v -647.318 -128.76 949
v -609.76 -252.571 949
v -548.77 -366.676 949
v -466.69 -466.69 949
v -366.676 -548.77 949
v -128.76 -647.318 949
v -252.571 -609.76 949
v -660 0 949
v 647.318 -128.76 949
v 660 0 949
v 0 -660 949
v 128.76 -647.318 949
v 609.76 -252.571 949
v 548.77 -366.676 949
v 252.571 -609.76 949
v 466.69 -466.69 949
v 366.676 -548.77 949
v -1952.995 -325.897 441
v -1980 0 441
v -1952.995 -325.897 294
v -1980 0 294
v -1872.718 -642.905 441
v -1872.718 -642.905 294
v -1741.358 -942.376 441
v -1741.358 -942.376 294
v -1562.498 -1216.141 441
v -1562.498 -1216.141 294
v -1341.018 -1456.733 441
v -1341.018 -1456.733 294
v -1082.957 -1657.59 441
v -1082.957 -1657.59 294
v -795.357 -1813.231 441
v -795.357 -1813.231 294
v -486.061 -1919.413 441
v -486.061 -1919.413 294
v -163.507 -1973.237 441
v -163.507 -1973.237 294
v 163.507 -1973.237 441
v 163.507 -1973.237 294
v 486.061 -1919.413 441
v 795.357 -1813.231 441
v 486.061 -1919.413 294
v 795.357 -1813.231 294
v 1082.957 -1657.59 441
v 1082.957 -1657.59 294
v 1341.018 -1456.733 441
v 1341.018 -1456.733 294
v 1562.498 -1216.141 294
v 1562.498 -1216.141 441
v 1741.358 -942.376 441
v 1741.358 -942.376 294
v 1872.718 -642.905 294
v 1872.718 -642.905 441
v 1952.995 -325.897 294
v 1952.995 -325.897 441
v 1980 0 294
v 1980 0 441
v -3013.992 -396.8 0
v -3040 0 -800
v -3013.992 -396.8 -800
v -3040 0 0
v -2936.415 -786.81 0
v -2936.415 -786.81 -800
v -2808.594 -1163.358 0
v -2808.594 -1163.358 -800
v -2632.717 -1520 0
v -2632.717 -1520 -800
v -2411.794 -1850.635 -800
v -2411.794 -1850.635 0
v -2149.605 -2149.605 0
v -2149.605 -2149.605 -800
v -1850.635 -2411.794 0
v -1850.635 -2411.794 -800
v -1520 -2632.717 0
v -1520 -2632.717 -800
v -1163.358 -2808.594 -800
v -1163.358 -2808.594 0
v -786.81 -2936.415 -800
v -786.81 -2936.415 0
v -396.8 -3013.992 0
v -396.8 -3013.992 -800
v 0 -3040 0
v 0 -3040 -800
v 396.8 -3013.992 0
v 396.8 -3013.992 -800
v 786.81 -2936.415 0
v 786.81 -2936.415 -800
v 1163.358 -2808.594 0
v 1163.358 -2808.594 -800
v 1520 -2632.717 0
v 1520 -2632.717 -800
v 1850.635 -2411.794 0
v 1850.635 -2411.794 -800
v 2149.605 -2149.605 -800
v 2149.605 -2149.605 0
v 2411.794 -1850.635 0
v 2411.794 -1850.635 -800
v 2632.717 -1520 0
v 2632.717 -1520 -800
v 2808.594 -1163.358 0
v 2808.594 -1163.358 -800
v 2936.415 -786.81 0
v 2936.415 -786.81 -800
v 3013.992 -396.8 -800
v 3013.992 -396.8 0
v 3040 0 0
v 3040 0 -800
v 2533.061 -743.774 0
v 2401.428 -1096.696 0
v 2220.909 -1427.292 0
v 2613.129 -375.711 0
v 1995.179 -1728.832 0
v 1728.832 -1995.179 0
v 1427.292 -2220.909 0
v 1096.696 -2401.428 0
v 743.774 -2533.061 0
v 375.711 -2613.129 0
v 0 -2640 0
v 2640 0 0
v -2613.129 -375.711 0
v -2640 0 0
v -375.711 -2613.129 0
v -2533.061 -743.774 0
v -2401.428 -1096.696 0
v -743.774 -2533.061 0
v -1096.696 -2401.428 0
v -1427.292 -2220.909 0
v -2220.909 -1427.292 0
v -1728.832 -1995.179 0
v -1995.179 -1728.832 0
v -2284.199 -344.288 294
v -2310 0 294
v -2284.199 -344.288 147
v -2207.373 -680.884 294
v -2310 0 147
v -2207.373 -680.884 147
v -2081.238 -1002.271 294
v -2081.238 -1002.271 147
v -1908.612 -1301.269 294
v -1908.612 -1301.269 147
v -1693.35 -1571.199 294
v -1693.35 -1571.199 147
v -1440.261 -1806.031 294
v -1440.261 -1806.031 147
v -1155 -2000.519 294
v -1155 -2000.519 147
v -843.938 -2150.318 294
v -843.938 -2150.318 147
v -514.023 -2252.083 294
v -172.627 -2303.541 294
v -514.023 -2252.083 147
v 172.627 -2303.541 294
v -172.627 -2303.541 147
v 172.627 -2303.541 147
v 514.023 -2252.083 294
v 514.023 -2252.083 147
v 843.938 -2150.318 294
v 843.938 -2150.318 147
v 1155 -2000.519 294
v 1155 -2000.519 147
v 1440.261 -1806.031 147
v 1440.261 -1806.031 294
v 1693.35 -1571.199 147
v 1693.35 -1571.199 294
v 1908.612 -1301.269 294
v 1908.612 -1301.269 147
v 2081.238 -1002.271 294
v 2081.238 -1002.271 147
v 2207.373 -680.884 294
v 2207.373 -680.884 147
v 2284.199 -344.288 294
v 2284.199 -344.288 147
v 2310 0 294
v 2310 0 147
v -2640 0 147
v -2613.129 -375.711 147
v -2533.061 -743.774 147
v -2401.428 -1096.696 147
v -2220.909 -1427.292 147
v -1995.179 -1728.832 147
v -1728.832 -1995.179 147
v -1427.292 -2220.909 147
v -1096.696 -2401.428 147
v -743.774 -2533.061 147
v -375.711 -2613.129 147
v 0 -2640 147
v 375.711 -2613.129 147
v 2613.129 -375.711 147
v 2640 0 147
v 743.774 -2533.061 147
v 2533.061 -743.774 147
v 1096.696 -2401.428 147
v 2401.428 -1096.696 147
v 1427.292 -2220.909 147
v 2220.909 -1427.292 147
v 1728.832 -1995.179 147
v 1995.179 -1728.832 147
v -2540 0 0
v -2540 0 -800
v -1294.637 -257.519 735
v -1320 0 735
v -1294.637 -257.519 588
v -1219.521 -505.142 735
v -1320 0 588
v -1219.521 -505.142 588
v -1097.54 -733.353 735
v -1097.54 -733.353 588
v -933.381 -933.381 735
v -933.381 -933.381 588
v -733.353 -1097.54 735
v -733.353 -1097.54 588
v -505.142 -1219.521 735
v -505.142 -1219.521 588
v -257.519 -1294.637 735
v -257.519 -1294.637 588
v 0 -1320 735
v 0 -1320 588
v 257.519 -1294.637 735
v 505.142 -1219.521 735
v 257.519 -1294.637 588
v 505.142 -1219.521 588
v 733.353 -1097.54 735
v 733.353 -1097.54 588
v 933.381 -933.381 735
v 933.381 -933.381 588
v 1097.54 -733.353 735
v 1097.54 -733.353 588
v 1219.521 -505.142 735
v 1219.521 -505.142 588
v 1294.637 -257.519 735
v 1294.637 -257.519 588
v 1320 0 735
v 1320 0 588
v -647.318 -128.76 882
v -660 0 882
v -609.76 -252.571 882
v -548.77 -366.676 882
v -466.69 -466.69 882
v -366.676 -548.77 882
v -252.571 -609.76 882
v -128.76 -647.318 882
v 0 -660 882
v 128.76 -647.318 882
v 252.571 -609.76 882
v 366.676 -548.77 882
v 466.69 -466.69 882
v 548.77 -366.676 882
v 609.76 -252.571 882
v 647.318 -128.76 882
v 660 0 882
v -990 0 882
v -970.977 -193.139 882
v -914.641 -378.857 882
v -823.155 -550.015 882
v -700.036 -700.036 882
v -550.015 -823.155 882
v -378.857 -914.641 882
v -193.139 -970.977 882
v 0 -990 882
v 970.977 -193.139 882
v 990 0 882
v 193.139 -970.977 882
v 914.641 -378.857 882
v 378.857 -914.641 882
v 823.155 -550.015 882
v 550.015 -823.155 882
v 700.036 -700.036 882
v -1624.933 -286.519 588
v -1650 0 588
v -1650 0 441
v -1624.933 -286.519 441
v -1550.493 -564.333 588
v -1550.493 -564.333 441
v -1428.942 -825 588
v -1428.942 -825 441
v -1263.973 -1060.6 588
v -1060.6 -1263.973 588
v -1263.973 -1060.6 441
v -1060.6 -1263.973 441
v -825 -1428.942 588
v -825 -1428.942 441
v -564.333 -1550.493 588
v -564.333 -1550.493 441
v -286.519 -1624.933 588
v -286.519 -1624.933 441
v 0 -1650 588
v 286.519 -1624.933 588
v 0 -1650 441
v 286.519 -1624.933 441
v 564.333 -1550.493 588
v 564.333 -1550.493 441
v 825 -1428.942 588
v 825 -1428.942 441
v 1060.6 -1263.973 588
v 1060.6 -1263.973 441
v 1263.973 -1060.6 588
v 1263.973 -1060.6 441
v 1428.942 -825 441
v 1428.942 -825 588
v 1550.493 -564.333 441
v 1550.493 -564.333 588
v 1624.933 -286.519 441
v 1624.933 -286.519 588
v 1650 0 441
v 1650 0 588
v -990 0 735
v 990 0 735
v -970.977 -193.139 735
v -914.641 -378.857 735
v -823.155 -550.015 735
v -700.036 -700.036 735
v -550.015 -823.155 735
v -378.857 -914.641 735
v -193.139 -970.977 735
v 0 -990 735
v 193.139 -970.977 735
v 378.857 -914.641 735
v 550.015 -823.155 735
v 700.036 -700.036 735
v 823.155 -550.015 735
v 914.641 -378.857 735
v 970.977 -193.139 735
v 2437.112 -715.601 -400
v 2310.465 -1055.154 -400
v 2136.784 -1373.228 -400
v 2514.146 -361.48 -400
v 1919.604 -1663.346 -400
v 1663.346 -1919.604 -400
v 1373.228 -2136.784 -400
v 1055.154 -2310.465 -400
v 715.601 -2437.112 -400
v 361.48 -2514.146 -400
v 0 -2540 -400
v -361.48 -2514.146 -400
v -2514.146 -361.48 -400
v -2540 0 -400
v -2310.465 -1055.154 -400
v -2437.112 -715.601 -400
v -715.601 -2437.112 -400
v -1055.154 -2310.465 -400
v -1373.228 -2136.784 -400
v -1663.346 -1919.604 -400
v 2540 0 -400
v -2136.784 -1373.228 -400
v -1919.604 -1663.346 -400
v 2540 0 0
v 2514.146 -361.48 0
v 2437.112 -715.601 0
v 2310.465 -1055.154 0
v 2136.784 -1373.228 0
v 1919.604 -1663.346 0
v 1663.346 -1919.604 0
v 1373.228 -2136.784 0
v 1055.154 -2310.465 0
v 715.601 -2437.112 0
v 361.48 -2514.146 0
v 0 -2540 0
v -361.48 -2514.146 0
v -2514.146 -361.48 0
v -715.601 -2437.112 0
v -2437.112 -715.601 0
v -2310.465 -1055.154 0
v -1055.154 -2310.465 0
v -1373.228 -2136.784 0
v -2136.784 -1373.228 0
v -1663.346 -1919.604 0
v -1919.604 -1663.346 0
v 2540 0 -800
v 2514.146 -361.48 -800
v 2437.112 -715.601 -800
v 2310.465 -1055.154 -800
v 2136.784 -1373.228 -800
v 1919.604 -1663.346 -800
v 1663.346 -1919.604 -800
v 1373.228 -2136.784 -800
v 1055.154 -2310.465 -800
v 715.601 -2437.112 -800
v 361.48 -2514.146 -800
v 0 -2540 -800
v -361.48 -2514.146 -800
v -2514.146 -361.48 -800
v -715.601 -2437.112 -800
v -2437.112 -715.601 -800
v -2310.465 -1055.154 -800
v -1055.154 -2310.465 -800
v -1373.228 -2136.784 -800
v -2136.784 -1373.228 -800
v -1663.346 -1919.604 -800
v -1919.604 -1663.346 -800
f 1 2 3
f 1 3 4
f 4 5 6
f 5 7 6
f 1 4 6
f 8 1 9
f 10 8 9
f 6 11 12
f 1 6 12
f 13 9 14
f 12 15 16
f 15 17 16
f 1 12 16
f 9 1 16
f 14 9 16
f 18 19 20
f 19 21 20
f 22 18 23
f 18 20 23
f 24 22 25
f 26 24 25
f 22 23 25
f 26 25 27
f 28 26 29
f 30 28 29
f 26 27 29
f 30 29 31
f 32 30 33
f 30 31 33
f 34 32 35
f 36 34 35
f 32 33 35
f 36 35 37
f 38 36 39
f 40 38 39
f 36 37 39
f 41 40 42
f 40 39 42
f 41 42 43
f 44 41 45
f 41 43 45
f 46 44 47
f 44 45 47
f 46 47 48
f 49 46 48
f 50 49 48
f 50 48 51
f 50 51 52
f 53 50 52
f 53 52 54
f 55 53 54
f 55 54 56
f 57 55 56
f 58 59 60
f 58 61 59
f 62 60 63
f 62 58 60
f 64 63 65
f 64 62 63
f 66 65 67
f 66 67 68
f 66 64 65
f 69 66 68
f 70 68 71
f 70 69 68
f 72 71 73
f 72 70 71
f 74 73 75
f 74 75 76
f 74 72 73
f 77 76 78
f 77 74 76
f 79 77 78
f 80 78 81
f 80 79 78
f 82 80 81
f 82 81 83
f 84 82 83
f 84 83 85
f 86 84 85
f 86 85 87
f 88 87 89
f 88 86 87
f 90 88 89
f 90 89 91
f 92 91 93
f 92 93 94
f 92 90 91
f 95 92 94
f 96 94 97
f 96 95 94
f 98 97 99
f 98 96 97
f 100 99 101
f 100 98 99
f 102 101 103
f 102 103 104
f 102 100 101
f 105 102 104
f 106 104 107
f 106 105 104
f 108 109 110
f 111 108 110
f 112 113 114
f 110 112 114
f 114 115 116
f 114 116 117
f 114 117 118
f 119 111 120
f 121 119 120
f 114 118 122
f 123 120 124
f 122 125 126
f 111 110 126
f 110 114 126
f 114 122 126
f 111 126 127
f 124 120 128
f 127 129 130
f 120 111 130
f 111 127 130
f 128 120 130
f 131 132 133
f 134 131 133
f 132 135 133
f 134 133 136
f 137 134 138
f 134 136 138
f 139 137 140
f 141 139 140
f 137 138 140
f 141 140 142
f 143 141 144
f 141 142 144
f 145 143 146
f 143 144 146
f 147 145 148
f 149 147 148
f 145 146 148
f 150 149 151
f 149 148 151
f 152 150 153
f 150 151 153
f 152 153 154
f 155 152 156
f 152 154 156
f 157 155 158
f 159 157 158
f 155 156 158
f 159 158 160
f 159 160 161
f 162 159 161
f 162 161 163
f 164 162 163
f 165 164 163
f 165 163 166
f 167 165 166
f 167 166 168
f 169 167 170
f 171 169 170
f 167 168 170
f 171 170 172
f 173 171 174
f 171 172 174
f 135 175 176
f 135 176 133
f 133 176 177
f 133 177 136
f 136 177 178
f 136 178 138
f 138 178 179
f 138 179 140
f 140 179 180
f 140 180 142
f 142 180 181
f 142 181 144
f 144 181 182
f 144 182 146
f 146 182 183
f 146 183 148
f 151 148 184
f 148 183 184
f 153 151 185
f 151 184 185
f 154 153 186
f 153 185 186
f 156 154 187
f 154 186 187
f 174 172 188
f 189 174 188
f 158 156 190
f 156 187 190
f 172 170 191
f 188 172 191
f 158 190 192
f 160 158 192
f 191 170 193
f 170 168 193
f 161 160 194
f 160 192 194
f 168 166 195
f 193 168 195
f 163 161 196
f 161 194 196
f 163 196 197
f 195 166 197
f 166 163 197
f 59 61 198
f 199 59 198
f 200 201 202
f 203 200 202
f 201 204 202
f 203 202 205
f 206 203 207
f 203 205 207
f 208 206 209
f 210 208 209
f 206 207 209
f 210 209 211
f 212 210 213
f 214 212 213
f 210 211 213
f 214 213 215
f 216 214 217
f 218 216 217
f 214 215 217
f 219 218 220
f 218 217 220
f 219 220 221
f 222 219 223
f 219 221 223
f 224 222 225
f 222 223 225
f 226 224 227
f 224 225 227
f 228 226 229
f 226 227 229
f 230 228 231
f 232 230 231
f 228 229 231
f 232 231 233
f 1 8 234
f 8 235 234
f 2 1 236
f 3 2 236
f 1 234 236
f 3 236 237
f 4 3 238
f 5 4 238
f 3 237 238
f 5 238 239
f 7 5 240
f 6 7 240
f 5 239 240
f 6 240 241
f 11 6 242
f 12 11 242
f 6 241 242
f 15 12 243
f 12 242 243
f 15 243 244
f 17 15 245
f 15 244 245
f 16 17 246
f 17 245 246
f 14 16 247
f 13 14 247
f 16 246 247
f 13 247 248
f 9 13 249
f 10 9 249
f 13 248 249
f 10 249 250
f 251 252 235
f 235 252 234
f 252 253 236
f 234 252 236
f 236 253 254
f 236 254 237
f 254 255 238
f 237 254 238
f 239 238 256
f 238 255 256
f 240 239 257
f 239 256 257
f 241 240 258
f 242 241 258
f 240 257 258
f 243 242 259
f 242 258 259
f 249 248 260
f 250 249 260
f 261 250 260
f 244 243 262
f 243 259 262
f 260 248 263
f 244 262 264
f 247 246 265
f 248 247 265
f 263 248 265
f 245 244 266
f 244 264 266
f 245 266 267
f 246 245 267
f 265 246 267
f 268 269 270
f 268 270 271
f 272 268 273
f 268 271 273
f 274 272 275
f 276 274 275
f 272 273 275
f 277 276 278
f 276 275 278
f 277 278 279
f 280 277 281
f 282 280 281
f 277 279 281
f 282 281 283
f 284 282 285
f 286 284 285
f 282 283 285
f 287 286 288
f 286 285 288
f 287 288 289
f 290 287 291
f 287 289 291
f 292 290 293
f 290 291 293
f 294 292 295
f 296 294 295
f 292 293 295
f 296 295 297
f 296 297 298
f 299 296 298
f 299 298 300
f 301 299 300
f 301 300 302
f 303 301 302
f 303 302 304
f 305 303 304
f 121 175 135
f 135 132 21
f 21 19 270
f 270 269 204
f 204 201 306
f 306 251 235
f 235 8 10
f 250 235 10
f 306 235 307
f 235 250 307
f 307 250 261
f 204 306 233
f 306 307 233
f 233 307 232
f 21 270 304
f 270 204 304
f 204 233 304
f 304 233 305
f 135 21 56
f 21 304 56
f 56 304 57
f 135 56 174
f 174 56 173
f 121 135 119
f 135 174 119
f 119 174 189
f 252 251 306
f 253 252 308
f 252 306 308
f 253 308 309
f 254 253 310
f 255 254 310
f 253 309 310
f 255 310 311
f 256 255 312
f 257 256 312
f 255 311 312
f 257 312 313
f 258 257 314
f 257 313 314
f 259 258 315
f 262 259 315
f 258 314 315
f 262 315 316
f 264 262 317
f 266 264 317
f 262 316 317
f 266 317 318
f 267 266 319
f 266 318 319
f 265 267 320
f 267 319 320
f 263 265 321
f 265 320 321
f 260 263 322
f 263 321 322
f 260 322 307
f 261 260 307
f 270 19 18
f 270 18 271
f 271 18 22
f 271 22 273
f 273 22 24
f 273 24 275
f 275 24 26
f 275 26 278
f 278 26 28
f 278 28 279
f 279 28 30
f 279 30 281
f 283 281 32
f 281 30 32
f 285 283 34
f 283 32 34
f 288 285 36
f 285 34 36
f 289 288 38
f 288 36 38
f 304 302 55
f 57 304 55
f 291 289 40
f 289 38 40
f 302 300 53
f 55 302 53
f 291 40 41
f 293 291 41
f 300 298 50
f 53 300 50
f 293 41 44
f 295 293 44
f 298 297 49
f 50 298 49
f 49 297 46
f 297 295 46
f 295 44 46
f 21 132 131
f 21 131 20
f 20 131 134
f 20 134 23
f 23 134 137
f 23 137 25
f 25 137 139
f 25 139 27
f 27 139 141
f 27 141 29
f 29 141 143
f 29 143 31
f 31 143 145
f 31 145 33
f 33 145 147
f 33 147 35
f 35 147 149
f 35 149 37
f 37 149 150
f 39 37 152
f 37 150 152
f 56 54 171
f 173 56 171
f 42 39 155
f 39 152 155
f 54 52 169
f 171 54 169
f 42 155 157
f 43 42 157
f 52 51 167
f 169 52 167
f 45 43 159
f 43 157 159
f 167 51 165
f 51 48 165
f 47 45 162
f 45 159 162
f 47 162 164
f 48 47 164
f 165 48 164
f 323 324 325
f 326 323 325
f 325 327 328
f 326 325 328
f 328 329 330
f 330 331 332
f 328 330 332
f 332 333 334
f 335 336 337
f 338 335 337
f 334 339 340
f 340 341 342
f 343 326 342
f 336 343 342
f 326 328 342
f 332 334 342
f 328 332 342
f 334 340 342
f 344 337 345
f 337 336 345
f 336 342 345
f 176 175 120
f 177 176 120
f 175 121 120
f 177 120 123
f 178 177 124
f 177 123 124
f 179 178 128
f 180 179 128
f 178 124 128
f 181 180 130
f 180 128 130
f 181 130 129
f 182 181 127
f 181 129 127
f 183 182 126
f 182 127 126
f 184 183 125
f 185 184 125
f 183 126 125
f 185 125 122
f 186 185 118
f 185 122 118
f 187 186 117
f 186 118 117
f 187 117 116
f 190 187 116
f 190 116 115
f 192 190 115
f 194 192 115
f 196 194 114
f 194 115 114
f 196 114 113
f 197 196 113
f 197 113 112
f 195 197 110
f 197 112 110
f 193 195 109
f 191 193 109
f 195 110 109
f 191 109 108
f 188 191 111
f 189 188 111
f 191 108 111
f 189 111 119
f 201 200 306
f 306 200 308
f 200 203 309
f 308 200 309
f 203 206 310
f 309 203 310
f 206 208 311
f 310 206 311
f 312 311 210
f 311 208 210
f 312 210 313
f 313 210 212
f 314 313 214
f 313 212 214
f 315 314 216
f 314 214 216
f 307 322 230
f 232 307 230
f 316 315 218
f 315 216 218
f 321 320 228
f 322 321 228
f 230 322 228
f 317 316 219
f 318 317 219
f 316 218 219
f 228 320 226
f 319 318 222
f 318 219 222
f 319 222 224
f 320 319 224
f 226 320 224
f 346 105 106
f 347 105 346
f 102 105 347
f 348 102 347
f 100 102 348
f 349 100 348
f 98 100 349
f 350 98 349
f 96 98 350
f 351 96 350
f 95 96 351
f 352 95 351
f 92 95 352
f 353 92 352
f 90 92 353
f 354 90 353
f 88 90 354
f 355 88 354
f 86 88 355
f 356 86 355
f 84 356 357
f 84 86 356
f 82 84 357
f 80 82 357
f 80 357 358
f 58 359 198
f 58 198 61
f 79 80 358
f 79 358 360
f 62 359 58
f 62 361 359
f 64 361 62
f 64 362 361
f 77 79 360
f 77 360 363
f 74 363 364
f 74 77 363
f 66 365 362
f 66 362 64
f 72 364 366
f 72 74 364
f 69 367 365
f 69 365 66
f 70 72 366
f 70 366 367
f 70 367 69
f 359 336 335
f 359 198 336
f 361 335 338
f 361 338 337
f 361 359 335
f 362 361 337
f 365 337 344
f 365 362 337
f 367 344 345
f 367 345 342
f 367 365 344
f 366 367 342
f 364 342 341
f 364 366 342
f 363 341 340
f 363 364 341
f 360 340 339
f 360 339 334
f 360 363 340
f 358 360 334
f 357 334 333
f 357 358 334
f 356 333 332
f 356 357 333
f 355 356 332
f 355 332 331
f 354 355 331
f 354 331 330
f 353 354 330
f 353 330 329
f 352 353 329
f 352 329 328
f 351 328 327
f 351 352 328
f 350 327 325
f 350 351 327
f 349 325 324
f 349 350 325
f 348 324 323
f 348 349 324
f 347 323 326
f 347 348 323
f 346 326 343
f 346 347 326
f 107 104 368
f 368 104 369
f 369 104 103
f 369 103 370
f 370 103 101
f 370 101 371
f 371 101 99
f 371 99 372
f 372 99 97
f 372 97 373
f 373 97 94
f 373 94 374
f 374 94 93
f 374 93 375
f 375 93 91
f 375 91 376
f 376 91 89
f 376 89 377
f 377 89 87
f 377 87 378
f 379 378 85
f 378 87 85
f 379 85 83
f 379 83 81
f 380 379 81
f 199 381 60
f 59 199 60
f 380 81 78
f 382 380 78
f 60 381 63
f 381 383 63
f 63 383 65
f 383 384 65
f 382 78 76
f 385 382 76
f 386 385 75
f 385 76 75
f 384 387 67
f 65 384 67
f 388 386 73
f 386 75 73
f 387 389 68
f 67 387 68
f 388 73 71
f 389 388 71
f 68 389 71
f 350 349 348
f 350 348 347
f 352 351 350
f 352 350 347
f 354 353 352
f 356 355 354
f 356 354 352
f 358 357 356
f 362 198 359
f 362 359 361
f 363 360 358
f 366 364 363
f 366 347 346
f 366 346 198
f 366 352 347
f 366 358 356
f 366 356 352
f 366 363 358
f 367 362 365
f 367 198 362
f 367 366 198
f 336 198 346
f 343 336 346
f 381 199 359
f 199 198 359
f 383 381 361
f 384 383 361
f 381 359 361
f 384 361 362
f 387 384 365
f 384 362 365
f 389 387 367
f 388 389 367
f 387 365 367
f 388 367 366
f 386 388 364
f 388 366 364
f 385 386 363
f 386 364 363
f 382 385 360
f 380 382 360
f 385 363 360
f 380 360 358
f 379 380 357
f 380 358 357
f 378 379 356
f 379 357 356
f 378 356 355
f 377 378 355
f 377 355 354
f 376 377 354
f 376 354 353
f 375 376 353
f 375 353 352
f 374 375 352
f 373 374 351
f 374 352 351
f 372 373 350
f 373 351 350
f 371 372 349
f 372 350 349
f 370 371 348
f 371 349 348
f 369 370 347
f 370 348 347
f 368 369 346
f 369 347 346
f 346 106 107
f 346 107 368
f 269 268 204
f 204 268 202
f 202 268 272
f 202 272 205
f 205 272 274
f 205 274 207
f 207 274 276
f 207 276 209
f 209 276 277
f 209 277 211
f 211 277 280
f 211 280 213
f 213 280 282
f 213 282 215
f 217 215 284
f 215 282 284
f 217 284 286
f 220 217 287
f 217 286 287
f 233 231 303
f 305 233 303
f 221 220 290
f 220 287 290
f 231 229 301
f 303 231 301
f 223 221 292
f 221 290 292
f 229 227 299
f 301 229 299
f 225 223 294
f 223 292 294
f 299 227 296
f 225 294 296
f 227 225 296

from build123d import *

# Parameters (mm, degrees)
F1_ANGLE = 180
F2_W     = 500
F2_H     = 800
F3_ANGLE = 180
F4_W     = 2540
F4_H     = 400
F5_ANGLE = -180


with BuildPart() as f1:
    # F0 (on Front) → F1 (revolve)
    with BuildSketch(Plane.XZ):
        Polygon((-660, 949), (-660, 882), (-990, 882), (-990, 735), (-1320, 735), (-1320, 588), (-1650, 588), (-1650, 441), (-1980, 441), (-1980, 294), (-2310, 294), (-2310, 147), (-2640, 147), (-2640, 0), (0, 0), (0, 949), align=None)
    revolve(axis=Axis((0, 0, 474.5), (0, 0, 1)), revolution_arc=F1_ANGLE)


with BuildPart() as f3:
    # F2 (on Front) → F3 (revolve)
    with BuildSketch(Plane.XZ):
        with Locations((-2790, -400)):
            Rectangle(F2_W, F2_H)
    revolve(axis=Axis((0, 0, 474.5), (0, 0, 1)), revolution_arc=F3_ANGLE)


with BuildPart() as f5:
    # F4 (on Front) → F5 (revolve)
    with BuildSketch(Plane.XZ):
        with Locations((-1270, -200)):
            Rectangle(F4_W, F4_H)
    revolve(axis=Axis((0, 0, -200), (0, 0, -1)), revolution_arc=F5_ANGLE)


solid = Compound([f1.part, f3.part, f5.part])
